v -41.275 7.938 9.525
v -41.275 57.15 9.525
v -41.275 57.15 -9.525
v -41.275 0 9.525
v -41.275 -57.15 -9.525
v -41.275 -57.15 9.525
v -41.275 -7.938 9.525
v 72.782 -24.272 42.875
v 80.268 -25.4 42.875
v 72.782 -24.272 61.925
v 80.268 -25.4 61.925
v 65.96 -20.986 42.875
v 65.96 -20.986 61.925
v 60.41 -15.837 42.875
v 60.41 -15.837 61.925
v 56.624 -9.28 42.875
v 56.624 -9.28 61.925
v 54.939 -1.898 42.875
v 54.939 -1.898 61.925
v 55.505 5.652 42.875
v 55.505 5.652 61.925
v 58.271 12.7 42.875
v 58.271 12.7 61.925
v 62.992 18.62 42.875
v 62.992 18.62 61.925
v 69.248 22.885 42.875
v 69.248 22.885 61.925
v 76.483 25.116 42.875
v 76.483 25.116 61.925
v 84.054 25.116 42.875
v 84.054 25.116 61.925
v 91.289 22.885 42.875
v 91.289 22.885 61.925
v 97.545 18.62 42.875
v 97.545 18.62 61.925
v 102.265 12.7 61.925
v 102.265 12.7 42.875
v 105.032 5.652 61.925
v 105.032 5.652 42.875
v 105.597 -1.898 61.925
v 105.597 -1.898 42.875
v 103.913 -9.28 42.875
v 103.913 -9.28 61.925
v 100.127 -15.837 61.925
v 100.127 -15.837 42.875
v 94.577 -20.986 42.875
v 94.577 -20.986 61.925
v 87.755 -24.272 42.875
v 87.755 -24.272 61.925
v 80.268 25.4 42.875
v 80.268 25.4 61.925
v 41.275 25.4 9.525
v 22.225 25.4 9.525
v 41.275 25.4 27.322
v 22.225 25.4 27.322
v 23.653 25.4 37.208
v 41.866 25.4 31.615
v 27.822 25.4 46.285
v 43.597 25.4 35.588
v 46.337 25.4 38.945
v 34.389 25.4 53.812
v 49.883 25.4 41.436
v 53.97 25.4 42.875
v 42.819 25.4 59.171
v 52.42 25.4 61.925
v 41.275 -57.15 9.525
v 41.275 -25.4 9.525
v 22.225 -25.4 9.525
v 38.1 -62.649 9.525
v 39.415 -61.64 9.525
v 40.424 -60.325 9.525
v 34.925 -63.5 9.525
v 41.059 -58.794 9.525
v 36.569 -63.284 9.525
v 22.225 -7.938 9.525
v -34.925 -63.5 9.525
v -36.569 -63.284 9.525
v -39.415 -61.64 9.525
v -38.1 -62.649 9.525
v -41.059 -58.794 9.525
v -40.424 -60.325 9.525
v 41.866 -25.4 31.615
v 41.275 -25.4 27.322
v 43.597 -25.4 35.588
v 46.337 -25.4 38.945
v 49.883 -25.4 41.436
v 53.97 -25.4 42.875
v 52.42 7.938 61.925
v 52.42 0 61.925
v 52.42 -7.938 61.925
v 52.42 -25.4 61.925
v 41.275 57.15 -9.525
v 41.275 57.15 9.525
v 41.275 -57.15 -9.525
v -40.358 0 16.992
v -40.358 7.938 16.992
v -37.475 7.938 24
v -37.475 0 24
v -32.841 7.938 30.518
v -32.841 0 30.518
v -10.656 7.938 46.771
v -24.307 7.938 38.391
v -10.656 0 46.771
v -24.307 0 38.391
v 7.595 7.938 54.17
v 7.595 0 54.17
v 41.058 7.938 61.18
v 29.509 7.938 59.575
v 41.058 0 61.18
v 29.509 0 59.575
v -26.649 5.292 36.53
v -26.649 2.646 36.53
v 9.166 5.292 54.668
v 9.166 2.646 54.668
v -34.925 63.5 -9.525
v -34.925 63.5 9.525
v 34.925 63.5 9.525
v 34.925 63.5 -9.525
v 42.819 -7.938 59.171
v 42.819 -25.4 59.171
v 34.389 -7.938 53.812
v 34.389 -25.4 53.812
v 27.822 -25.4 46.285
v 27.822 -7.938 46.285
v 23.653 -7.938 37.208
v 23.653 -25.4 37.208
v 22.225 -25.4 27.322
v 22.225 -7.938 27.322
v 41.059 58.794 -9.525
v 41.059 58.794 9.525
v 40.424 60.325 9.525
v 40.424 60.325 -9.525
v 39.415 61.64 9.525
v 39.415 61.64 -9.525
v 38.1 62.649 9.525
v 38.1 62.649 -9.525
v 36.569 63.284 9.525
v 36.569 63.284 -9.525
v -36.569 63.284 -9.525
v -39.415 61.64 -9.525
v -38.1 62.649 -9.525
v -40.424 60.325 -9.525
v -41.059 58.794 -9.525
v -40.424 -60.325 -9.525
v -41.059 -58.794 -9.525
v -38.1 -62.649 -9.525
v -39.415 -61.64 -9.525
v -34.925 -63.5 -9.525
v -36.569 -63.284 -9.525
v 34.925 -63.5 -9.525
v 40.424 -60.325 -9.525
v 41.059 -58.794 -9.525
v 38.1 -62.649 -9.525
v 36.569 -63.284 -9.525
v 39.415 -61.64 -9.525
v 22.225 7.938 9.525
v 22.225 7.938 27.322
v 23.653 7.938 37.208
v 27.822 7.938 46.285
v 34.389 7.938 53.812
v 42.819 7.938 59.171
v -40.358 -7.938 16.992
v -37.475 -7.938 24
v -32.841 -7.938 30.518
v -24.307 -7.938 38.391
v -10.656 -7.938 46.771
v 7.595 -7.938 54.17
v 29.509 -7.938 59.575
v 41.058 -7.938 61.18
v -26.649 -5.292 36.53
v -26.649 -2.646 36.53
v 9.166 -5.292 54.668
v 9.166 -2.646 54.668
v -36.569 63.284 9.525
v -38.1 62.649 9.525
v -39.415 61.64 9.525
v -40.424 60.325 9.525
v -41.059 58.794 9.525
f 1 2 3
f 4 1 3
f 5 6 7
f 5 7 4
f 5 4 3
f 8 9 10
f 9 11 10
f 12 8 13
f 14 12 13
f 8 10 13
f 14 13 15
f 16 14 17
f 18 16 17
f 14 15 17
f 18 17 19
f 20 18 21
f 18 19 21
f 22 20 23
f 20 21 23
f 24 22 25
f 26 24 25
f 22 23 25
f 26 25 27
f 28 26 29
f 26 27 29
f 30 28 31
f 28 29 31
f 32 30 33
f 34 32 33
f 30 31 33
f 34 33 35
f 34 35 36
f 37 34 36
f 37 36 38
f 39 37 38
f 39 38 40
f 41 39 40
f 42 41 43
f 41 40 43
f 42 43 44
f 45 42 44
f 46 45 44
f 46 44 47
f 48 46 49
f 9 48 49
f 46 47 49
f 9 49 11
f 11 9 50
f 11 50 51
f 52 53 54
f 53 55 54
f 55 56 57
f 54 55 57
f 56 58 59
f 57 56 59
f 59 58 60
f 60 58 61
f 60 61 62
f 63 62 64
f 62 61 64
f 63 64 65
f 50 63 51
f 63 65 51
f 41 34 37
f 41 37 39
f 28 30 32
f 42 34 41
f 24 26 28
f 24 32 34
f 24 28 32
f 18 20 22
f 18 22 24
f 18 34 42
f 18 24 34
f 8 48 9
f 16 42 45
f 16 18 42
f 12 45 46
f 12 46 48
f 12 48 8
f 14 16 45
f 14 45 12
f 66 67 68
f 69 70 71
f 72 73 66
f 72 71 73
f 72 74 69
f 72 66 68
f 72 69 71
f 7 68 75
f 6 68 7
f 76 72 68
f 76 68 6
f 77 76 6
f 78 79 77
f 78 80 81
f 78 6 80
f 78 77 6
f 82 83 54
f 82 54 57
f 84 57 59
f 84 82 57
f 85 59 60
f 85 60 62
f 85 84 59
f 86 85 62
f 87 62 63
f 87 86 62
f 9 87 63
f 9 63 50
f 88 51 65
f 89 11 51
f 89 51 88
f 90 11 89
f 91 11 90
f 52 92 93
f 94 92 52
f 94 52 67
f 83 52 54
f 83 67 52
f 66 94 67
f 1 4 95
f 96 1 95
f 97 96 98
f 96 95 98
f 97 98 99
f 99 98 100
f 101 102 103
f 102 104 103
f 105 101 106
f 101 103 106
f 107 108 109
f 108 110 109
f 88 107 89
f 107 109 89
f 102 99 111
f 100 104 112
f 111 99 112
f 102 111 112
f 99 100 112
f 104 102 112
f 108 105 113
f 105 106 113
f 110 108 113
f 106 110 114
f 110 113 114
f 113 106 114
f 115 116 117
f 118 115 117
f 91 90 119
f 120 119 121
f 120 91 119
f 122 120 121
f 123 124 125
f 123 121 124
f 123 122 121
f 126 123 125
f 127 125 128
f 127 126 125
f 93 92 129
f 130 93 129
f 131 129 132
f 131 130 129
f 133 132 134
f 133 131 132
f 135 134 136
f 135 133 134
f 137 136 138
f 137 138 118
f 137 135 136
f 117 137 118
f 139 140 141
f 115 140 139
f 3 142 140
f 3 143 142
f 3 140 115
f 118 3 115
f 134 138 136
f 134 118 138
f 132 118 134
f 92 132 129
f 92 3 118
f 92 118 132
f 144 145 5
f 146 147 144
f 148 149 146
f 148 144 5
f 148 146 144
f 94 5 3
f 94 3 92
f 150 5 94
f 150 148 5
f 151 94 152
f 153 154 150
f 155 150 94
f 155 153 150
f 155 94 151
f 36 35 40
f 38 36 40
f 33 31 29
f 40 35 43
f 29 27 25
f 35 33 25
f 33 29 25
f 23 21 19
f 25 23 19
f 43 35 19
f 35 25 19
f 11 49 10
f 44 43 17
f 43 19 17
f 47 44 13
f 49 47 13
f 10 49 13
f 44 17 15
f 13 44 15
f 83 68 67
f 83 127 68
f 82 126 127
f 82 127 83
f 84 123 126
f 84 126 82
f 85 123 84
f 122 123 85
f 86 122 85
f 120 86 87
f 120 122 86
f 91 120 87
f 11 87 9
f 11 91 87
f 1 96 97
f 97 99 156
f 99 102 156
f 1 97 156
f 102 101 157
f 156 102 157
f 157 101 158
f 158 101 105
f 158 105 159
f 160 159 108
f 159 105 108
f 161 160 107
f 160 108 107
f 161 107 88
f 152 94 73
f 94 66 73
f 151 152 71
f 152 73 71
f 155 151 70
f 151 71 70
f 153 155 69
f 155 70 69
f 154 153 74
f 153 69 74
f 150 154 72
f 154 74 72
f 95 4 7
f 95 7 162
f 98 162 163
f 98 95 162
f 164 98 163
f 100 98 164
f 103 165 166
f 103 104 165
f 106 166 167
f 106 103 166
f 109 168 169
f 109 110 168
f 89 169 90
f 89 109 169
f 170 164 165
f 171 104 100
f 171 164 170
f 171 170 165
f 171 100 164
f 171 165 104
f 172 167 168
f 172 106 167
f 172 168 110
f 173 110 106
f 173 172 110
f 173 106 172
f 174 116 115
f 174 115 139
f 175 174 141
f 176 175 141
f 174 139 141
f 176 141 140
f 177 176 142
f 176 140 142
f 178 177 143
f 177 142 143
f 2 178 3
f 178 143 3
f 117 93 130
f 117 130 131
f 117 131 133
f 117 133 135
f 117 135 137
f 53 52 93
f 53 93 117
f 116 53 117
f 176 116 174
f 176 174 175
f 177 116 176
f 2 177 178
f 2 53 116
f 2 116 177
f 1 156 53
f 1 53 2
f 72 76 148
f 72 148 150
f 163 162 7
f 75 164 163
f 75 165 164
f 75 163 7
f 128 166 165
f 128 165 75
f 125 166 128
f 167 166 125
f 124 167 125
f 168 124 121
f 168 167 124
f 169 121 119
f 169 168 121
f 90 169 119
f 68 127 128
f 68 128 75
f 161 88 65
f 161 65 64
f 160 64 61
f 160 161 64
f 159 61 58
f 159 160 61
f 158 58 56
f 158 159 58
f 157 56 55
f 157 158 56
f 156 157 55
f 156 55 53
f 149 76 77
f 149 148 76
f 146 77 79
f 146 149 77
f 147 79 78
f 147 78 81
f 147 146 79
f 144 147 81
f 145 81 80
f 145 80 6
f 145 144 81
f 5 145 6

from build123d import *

# Parameters (mm, degrees)
F1_DEPTH = 63.5
F2_DEPTH = 25.4
F3_DEPTH = 7.9375
F4_W     = 25.4
F4_H     = 19.05
F6_R     = 6.35


with BuildPart() as f1:
    # F0 (on Front) → F1 (new body, symmetric)
    with BuildSketch(Plane.XZ):
        Polygon((41.275, -9.525), (41.275, 9.525), (22.225, 9.525), (-41.275, 9.525), (-41.275, -9.525), align=None)
    extrude(amount=F1_DEPTH, both=True)

    # F0 (on Front) → F2 (join, symmetric)
    with BuildSketch(Plane.XZ):
        with BuildLine():
            Line((22.225, 9.525), (41.275, 9.525))
            Line((41.275, 9.525), (41.275, 27.321972))
            ThreePointArc((41.275, 27.321972), (44.851648, 37.360207), (53.96995, 42.8752))
            Line((53.96995, 42.8752), (80.268452, 42.8752))
            Line((80.268452, 42.8752), (80.268452, 61.9252))
            Line((80.268452, 61.9252), (52.420072, 61.9252))
            ThreePointArc((52.420072, 61.9252), (30.835096, 50.284581), (22.225, 27.321972))
            Line((22.225, 27.321972), (22.225, 9.525))
        make_face()
    extrude(amount=F2_DEPTH, both=True)

    # F0 (on Front) → F3 (join, symmetric)
    with BuildSketch(Plane.XZ):
        with BuildLine():
            Line((-41.275, 9.525), (22.225, 9.525))
            Line((22.225, 9.525), (22.225, 27.321972))
            ThreePointArc((22.225, 27.321972), (30.835096, 50.284581), (52.420072, 61.9252))
            add(Edge.make_bspline(
                [(-41.275, 9.525), (-41.826107, 40.29214), (10.028608, 60.780372), (52.420072, 61.9252)],
                knots=[0, 0, 0, 0, 107.352445, 107.352445, 107.352445, 107.352445], degree=3))
        make_face()
    extrude(amount=F3_DEPTH, both=True)

    # F6
    f6_edges = [f1.edges().sort_by_distance(p)[0] for p in [
        (41.275, -63.5, 0),
        (41.275, 63.5, 0),
        (-41.275, 63.5, 0),
        (-41.275, -63.5, 0),
    ]]
    fillet(f6_edges, radius=F6_R)


with BuildPart() as f5:
    # F4 (on face) → F5 (revolve)
    with BuildSketch(Plane.YZ.offset(80.268452)):
        with Locations((-12.7, 52.4002)):
            Rectangle(F4_W, F4_H)
    revolve(axis=Axis((80.268452, 0, 52.4002), (0, 0, -1)))


solid = Compound([f1.part, f5.part])
